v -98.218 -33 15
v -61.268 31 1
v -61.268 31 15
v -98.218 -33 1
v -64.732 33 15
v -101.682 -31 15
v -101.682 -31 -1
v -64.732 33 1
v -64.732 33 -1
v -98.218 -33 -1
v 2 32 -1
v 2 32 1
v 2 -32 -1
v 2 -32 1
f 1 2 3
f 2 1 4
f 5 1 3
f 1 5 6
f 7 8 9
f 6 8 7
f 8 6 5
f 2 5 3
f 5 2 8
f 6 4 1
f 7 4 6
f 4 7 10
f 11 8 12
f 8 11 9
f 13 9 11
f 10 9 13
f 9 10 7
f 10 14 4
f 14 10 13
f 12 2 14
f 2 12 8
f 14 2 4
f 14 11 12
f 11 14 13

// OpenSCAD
// file: configuration.scad
// Increase this if your slicer or printer make holes too tight.
extra_radius = 0.1;

// OD = outside diameter, corner to corner.
m3_nut_od = 6.1;
m3_nut_radius = m3_nut_od/2 + 0.2 + extra_radius;
m3_washer_radius = 3.5 + extra_radius;

// Major diameter of metric 3mm thread.
m3_major = 2.85;
m3_radius = m3_major/2 + extra_radius;
m3_wide_radius = m3_major/2 + extra_radius + 0.2;

// NEMA17 stepper motors.
motor_shaft_diameter = 5;
motor_shaft_radius = motor_shaft_diameter/2 + extra_radius;

// Frame brackets. M3x8mm screws work best with 3.6 mm brackets.
thickness = 3.6;

// OpenBeam or Misumi. Currently only 15x15 mm, but there is a plan
// to make models more parametric and allow 20x20 mm in the future.
extrusion = 15;

// HiWin, THK or Misumi
rail_width = 12;
rail_thickness = 8;

// Placement for the NEMA17 stepper motors.
motor_offset = 44;
motor_length = 47;
// main file
include <configuration.scad>;

thickness=4;
top=130;
width=64;
height=15;

module holder() {
	difference() {
		trapezoid(top, height);
		translate([thickness,0,thickness]) 
			trapezoid(top - thickness, height-thickness);
		
		// mount holes
		for(a = [-30, 20]) {
			rotate([0,90,-30]) translate([0,a,-12.2]) screw_socket();
		}
		
	}
}

module trapezoid(top, height,center=true) {
	hull() {
		translate([-top/2, 0, 0]) rotate([0,-60,0])cube([top,height,thickness], center=true);
		translate([-top/2, 0, 0]) rotate([0,60,0])cube([top,height,thickness], center=true);
	}
}


module printrboard($fn=20) {
	dimmensions=[100,61,2];
	offset= 2 + m3_wide_radius;
	
	difference() {
		cube(dimmensions, center=true);
		translate([dimmensions[0]/2 - offset, dimmensions[1]/2 -offset, 0]) 
			cylinder(r=m3_radius, h=5, center=true);
		translate([-dimmensions[0]/2 + offset, dimmensions[1]/2 -offset, 0]) 
			cylinder(r=m3_radius, h=5, center=true);
		translate([dimmensions[0]/2 - offset, -dimmensions[1]/2 + offset, 0]) 
			cylinder(r=m3_radius, h=5, center=true);
		translate([-dimmensions[0]/2 + offset, -dimmensions[1]/2 + offset, 0]) 
			cylinder(r=m3_radius, h=5, center=true);
	}
}
h = width/sin(60);
union() {
	
	translate([0, 0, 5]) % printrboard();		
	
	translate([-top/2-h/4+thickness/2, 0, height/2]) rotate([0,0,-30]) 
		cube([thickness, h,height], center=true);
	hull() {
		cube([thickness, width, 2], center=true);
		translate([-top/2-h/4+thickness/2, 0, 0]) rotate([0,0,-30]) 
			cube([thickness, h, 2], center=true);
	}
	
}
